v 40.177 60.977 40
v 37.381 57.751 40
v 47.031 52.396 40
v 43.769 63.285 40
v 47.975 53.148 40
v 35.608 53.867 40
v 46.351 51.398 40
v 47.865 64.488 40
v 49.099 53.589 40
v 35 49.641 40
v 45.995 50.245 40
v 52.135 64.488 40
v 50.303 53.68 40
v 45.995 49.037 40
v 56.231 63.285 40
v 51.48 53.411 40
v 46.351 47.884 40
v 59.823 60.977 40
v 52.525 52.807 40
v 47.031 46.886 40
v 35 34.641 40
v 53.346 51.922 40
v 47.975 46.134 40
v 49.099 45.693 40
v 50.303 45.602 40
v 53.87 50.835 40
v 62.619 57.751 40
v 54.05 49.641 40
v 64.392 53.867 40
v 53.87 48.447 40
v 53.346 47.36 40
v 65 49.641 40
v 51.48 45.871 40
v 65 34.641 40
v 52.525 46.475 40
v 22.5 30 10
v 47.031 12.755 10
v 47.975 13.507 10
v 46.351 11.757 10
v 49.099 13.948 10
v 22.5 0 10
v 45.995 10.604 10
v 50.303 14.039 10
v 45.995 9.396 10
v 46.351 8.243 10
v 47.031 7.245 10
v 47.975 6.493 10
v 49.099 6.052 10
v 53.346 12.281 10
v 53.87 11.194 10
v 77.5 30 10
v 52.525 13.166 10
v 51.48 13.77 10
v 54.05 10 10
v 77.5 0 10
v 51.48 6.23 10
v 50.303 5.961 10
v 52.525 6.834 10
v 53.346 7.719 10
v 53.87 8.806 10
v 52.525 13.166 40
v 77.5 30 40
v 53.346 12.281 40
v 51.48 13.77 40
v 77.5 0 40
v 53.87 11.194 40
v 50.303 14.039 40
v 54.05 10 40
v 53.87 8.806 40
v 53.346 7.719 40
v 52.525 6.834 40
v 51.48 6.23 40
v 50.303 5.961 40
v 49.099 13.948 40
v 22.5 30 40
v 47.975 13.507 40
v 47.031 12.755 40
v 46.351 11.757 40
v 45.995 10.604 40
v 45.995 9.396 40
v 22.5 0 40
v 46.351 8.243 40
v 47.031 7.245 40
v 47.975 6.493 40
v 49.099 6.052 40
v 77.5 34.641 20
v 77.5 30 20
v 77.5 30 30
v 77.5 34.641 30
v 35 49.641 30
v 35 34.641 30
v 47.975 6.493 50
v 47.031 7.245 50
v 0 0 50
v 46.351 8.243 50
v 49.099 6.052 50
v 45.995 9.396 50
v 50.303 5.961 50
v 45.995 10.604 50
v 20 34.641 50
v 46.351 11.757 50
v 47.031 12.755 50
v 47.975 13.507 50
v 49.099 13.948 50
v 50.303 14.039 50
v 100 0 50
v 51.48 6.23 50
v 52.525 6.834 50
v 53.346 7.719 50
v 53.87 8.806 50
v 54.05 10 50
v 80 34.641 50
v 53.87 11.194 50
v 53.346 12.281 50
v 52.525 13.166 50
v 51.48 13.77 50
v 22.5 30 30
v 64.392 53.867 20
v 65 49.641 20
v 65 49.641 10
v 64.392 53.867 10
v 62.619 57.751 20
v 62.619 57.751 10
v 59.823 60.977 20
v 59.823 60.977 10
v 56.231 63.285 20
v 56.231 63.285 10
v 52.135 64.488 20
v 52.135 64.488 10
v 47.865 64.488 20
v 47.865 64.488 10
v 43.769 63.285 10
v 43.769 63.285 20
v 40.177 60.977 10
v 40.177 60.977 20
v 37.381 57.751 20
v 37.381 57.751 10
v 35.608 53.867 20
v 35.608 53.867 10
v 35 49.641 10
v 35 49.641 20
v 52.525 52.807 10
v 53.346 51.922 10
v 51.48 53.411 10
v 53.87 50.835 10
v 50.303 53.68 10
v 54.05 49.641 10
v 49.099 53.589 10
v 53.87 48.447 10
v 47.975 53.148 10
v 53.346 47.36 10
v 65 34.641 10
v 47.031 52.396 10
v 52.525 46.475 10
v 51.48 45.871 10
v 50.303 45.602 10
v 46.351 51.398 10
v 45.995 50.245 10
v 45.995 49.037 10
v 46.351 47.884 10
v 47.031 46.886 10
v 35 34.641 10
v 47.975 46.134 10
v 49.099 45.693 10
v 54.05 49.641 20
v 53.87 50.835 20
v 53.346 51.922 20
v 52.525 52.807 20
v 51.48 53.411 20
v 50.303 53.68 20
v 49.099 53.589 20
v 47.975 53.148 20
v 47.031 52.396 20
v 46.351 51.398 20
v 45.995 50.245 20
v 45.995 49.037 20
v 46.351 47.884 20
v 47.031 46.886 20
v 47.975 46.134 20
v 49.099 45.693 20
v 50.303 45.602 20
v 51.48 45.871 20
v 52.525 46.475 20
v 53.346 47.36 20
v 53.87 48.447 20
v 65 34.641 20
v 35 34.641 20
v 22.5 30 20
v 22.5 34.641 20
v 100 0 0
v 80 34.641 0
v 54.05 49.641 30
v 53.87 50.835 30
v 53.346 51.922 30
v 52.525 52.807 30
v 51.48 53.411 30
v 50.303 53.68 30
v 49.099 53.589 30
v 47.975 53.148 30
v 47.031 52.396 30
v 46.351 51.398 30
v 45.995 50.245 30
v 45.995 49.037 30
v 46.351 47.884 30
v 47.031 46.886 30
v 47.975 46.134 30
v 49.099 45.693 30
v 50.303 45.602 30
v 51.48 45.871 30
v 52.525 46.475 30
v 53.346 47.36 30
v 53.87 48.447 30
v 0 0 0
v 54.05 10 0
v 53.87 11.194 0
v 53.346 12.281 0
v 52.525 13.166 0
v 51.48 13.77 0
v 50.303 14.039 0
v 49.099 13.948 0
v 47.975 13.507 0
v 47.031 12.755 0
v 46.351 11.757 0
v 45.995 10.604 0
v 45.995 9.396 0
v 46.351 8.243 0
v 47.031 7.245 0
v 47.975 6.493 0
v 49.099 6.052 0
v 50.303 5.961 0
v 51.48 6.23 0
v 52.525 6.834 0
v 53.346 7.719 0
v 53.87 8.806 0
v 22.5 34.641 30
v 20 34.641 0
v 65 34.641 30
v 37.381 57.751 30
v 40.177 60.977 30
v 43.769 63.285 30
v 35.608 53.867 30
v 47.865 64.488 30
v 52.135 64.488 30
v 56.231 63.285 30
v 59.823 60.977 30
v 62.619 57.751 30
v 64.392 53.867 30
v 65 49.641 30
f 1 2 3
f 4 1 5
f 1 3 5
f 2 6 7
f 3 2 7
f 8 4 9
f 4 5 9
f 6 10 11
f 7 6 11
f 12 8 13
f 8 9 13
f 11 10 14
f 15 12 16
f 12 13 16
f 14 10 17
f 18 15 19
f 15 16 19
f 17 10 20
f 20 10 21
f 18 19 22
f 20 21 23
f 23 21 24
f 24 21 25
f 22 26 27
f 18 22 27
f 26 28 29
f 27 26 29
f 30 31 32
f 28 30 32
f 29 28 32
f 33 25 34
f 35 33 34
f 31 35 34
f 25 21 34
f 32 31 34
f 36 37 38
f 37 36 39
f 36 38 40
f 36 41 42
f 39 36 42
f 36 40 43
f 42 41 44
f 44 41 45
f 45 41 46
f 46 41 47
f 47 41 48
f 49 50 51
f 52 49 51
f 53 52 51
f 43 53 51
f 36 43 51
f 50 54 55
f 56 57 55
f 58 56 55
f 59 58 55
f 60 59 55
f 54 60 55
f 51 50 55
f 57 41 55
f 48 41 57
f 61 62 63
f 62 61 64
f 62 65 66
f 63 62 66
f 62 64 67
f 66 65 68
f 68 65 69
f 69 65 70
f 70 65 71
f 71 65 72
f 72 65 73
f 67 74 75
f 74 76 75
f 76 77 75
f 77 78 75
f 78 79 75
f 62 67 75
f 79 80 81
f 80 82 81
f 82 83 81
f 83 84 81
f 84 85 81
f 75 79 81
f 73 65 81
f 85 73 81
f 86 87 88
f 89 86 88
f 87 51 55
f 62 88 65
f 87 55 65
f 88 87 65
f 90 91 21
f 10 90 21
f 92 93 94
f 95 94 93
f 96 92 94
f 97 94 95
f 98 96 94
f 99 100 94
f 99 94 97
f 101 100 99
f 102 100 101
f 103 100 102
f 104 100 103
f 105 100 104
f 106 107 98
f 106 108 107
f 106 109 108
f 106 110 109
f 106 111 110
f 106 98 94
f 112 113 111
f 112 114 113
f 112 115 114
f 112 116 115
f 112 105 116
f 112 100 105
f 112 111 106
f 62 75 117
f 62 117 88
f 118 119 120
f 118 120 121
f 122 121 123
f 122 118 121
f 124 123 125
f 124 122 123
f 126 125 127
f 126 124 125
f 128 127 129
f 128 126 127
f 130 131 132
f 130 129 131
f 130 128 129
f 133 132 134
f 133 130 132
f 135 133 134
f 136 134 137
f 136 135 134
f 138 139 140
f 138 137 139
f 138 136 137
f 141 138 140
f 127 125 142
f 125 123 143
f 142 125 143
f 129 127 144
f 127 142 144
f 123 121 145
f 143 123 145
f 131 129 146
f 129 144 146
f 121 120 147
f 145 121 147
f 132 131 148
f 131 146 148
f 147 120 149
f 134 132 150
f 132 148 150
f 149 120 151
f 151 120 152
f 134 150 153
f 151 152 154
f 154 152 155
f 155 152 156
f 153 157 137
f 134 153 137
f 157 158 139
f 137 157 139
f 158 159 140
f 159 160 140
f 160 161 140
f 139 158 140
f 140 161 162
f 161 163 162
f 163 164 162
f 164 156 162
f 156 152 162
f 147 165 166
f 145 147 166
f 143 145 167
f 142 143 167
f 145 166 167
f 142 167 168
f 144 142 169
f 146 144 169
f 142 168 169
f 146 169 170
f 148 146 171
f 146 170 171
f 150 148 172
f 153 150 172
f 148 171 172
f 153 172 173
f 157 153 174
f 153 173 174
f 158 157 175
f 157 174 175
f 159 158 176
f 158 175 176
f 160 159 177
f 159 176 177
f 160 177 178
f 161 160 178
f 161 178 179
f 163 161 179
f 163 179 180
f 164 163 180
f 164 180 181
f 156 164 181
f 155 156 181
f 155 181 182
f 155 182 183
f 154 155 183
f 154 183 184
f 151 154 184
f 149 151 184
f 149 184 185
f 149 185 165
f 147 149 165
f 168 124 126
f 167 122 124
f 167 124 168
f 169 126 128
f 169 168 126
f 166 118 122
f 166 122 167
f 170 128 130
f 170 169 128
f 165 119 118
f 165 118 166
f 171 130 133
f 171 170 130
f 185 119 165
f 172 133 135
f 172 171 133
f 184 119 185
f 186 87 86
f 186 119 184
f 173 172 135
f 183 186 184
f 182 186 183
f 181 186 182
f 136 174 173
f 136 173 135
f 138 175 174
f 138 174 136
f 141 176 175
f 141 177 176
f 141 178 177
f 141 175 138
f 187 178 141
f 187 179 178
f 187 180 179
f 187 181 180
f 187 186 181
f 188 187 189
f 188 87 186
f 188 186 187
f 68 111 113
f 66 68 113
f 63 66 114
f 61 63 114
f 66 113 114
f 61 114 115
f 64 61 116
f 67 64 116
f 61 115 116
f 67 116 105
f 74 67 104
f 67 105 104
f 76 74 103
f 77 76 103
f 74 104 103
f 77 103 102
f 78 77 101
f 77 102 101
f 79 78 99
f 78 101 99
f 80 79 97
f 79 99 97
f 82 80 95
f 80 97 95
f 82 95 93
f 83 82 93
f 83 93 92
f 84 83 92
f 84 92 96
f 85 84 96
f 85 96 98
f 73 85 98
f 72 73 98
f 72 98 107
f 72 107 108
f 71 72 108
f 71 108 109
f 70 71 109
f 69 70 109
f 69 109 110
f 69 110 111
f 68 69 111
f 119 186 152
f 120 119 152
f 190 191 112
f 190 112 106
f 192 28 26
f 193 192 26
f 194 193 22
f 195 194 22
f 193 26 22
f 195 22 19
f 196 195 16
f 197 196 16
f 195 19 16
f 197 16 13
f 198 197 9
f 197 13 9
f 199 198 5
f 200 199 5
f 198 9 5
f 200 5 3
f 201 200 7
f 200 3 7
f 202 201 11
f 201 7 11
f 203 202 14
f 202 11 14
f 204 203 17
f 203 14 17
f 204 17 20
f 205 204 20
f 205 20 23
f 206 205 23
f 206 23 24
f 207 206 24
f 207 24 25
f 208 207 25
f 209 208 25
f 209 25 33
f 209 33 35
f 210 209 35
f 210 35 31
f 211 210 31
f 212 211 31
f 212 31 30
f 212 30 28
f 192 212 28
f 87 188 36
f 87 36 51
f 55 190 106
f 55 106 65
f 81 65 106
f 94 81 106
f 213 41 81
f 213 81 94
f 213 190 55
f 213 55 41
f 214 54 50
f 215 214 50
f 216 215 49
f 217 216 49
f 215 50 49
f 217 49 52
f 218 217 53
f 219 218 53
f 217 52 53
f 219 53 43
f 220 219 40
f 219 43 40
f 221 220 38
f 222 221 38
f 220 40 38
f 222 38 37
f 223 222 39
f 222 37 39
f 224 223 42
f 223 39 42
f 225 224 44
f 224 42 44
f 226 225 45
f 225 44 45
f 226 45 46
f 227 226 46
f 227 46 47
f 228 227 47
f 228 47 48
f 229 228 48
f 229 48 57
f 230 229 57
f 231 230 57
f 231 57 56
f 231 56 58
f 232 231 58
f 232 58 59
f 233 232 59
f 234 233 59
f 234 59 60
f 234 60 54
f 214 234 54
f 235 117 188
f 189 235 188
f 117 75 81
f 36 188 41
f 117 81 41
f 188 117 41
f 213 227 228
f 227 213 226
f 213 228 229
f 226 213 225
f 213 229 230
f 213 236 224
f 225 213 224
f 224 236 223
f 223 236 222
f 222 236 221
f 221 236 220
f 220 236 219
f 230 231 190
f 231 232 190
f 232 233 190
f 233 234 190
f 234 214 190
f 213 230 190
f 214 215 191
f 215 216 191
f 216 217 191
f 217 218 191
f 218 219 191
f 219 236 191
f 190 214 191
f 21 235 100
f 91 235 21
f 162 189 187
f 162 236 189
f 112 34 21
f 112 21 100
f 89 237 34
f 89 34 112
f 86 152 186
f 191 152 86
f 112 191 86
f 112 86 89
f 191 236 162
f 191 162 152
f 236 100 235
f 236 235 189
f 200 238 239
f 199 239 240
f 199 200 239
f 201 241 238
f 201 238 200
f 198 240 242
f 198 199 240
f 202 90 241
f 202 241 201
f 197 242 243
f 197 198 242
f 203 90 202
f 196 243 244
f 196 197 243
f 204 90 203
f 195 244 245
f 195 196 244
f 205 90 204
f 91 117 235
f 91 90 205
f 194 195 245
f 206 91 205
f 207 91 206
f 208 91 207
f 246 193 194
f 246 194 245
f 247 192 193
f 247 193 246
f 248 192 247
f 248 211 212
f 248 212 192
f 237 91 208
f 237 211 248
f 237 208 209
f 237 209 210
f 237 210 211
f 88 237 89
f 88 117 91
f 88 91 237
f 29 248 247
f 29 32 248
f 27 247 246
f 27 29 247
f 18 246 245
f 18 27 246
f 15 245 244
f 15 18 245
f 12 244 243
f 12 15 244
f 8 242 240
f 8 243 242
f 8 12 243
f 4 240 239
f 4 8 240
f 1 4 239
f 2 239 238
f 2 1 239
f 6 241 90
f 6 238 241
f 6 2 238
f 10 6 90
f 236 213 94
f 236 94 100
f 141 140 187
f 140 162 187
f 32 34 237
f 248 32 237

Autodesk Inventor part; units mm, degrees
ref_plane "YZ Plane" through (0, 0, 0) normal (1, 0, 0) x (0, 1, 0)
ref_plane "XZ Plane" through (0, 0, 0) normal (0, 1, 0) x (-1, 0, 0)
ref_plane "XY Plane" through (0, 0, 0) normal (0, 0, 1) x (1, 0, 0)
sketch "Sketch1" plane through (0, 0, 0) normal (0, 0, 1) x (1, 0, 0)
  line L0 (0, 0) -> (20, 34.641)
  line L1 (20, 34.641) -> (80, 34.641)
  line L2 (80, 34.641) -> (100, 0)
  line L3 (100, 0) -> (0, 0)
  dimension "d2" = 40
  dimension "d3" = 60
  dimension "d4" = 40
  dimension "d5" = 100
extrude "Extrusion1" add sketch "Sketch1" along normal blind 50
sketch "Sketch2" plane through (20, 34.641, 0) normal (0, 1, 0) x (1, 0, 0)
  line L0 (45, -10) -> (15, -10)
  line L1 (15, -10) -> (15, -40)
  line L2 (15, -40) -> (45, -40)
  line L3 (45, -40) -> (45, -10)
  line L4 (60, 0) -> (0, 0) projected
  line L5 (-20, 0) -> (-20, -50) projected
  line L6 (45, -20) -> (15, -20)
  line L7 (45, -30) -> (15, -30)
  point P0 (30, 0)
  point P1 (45, -25)
  point P2 (30, -40)
  dimension "d8" = 30
  dimension "d9" = 30
  dimension "d10" = 25
  dimension "d11" = 50
  dimension "d31" = 10
  dimension "d32" = 10
extrude "Extrusion2" add sketch "Sketch2" along normal blind 30 contours L3 L6 L1 L0 | L3 L2 L1 L7
sketch "Sketch3" plane through (0, 0, 0) normal (0, -1, 0) x (1, 0, 0)
  line L0 (22.5, 10) -> (77.5, 10)
  line L1 (77.5, 10) -> (77.5, 40)
  line L2 (77.5, 40) -> (22.5, 40)
  line L3 (22.5, 40) -> (22.5, 10)
  line L4 (0, 0) -> (0, 50) projected
  line L5 (0, 50) -> (100, 50) projected
  point P0 (50, 10)
  point P1 (22.5, 25)
  dimension "d14" = 55
  dimension "d15" = 30
  dimension "d16" = 50
  dimension "d17" = 25
extrude "Extrusion3" cut sketch "Sketch3" against normal blind 30
sketch "Sketch4" plane through (0, 0, 50) normal (0, 0, 1) x (1, 0, 0)
  circle A0 centre (50, 10) radius 4.05
  line L0 (0, 0) -> (100, 0) projected
  dimension "d20" = 8.1
  dimension "d21" = 10
  dimension "d22" = 50
extrude "Extrusion4" cut sketch "Sketch4" against normal up to surface (50 mm away)
sketch "Sketch5" plane through (35, 34.641, 40) normal (0, 0, 1) x (1, 0, 0)
  circle A0 centre (15, 15) radius 4.05
  line L0 (30, 0) -> (30, 30) projected
  line L1 (0, 30) -> (30, 30) projected
  line L2 (0, 0) -> (0, 30) projected
  arc A1 (30, 15) -> (0, 15) centre (15, 15) ccw
  line L3 (0, 15) -> (0, 30)
  line L4 (30, 30) -> (30, 15)
  line L5 (30, 30) -> (0, 30)
  point P0 (-35, -34.641)
  point P1 (15, 30)
  dimension "d25" = 8.1
  dimension "d26" = 15
  dimension "d27" = 15
  dimension "d28" = 15
extrude "Extrusion5" cut sketch "Sketch5" against normal up to surface (30 mm away)
sketch "Sketch6" plane through (0, 30, 0) normal (0, -1, 0) x (1, 0, 0)
  line L0 (77.5, 40) -> (77.5, 10) projected
  line L1 (22.5, 40) -> (77.5, 40) projected
  line L2 (22.5, 10) -> (22.5, 40) projected
  line L3 (77.5, 10) -> (22.5, 10) projected
  line L4 (77.5, 20) -> (22.5, 20)
  line L5 (22.5, 20) -> (22.5, 30)
  line L6 (22.5, 30) -> (77.5, 30)
  line L7 (77.5, 30) -> (77.5, 20)
  point P0 (0, 0)
  point P1 (22.5, 20)
  dimension "d33" = 10
  dimension "d34" = 10
extrude "Extrusion6" cut sketch "Sketch6" against normal up to surface (4.641 mm away) contours L0 L4 L2 L6
properties part number "center_wheel_well"
